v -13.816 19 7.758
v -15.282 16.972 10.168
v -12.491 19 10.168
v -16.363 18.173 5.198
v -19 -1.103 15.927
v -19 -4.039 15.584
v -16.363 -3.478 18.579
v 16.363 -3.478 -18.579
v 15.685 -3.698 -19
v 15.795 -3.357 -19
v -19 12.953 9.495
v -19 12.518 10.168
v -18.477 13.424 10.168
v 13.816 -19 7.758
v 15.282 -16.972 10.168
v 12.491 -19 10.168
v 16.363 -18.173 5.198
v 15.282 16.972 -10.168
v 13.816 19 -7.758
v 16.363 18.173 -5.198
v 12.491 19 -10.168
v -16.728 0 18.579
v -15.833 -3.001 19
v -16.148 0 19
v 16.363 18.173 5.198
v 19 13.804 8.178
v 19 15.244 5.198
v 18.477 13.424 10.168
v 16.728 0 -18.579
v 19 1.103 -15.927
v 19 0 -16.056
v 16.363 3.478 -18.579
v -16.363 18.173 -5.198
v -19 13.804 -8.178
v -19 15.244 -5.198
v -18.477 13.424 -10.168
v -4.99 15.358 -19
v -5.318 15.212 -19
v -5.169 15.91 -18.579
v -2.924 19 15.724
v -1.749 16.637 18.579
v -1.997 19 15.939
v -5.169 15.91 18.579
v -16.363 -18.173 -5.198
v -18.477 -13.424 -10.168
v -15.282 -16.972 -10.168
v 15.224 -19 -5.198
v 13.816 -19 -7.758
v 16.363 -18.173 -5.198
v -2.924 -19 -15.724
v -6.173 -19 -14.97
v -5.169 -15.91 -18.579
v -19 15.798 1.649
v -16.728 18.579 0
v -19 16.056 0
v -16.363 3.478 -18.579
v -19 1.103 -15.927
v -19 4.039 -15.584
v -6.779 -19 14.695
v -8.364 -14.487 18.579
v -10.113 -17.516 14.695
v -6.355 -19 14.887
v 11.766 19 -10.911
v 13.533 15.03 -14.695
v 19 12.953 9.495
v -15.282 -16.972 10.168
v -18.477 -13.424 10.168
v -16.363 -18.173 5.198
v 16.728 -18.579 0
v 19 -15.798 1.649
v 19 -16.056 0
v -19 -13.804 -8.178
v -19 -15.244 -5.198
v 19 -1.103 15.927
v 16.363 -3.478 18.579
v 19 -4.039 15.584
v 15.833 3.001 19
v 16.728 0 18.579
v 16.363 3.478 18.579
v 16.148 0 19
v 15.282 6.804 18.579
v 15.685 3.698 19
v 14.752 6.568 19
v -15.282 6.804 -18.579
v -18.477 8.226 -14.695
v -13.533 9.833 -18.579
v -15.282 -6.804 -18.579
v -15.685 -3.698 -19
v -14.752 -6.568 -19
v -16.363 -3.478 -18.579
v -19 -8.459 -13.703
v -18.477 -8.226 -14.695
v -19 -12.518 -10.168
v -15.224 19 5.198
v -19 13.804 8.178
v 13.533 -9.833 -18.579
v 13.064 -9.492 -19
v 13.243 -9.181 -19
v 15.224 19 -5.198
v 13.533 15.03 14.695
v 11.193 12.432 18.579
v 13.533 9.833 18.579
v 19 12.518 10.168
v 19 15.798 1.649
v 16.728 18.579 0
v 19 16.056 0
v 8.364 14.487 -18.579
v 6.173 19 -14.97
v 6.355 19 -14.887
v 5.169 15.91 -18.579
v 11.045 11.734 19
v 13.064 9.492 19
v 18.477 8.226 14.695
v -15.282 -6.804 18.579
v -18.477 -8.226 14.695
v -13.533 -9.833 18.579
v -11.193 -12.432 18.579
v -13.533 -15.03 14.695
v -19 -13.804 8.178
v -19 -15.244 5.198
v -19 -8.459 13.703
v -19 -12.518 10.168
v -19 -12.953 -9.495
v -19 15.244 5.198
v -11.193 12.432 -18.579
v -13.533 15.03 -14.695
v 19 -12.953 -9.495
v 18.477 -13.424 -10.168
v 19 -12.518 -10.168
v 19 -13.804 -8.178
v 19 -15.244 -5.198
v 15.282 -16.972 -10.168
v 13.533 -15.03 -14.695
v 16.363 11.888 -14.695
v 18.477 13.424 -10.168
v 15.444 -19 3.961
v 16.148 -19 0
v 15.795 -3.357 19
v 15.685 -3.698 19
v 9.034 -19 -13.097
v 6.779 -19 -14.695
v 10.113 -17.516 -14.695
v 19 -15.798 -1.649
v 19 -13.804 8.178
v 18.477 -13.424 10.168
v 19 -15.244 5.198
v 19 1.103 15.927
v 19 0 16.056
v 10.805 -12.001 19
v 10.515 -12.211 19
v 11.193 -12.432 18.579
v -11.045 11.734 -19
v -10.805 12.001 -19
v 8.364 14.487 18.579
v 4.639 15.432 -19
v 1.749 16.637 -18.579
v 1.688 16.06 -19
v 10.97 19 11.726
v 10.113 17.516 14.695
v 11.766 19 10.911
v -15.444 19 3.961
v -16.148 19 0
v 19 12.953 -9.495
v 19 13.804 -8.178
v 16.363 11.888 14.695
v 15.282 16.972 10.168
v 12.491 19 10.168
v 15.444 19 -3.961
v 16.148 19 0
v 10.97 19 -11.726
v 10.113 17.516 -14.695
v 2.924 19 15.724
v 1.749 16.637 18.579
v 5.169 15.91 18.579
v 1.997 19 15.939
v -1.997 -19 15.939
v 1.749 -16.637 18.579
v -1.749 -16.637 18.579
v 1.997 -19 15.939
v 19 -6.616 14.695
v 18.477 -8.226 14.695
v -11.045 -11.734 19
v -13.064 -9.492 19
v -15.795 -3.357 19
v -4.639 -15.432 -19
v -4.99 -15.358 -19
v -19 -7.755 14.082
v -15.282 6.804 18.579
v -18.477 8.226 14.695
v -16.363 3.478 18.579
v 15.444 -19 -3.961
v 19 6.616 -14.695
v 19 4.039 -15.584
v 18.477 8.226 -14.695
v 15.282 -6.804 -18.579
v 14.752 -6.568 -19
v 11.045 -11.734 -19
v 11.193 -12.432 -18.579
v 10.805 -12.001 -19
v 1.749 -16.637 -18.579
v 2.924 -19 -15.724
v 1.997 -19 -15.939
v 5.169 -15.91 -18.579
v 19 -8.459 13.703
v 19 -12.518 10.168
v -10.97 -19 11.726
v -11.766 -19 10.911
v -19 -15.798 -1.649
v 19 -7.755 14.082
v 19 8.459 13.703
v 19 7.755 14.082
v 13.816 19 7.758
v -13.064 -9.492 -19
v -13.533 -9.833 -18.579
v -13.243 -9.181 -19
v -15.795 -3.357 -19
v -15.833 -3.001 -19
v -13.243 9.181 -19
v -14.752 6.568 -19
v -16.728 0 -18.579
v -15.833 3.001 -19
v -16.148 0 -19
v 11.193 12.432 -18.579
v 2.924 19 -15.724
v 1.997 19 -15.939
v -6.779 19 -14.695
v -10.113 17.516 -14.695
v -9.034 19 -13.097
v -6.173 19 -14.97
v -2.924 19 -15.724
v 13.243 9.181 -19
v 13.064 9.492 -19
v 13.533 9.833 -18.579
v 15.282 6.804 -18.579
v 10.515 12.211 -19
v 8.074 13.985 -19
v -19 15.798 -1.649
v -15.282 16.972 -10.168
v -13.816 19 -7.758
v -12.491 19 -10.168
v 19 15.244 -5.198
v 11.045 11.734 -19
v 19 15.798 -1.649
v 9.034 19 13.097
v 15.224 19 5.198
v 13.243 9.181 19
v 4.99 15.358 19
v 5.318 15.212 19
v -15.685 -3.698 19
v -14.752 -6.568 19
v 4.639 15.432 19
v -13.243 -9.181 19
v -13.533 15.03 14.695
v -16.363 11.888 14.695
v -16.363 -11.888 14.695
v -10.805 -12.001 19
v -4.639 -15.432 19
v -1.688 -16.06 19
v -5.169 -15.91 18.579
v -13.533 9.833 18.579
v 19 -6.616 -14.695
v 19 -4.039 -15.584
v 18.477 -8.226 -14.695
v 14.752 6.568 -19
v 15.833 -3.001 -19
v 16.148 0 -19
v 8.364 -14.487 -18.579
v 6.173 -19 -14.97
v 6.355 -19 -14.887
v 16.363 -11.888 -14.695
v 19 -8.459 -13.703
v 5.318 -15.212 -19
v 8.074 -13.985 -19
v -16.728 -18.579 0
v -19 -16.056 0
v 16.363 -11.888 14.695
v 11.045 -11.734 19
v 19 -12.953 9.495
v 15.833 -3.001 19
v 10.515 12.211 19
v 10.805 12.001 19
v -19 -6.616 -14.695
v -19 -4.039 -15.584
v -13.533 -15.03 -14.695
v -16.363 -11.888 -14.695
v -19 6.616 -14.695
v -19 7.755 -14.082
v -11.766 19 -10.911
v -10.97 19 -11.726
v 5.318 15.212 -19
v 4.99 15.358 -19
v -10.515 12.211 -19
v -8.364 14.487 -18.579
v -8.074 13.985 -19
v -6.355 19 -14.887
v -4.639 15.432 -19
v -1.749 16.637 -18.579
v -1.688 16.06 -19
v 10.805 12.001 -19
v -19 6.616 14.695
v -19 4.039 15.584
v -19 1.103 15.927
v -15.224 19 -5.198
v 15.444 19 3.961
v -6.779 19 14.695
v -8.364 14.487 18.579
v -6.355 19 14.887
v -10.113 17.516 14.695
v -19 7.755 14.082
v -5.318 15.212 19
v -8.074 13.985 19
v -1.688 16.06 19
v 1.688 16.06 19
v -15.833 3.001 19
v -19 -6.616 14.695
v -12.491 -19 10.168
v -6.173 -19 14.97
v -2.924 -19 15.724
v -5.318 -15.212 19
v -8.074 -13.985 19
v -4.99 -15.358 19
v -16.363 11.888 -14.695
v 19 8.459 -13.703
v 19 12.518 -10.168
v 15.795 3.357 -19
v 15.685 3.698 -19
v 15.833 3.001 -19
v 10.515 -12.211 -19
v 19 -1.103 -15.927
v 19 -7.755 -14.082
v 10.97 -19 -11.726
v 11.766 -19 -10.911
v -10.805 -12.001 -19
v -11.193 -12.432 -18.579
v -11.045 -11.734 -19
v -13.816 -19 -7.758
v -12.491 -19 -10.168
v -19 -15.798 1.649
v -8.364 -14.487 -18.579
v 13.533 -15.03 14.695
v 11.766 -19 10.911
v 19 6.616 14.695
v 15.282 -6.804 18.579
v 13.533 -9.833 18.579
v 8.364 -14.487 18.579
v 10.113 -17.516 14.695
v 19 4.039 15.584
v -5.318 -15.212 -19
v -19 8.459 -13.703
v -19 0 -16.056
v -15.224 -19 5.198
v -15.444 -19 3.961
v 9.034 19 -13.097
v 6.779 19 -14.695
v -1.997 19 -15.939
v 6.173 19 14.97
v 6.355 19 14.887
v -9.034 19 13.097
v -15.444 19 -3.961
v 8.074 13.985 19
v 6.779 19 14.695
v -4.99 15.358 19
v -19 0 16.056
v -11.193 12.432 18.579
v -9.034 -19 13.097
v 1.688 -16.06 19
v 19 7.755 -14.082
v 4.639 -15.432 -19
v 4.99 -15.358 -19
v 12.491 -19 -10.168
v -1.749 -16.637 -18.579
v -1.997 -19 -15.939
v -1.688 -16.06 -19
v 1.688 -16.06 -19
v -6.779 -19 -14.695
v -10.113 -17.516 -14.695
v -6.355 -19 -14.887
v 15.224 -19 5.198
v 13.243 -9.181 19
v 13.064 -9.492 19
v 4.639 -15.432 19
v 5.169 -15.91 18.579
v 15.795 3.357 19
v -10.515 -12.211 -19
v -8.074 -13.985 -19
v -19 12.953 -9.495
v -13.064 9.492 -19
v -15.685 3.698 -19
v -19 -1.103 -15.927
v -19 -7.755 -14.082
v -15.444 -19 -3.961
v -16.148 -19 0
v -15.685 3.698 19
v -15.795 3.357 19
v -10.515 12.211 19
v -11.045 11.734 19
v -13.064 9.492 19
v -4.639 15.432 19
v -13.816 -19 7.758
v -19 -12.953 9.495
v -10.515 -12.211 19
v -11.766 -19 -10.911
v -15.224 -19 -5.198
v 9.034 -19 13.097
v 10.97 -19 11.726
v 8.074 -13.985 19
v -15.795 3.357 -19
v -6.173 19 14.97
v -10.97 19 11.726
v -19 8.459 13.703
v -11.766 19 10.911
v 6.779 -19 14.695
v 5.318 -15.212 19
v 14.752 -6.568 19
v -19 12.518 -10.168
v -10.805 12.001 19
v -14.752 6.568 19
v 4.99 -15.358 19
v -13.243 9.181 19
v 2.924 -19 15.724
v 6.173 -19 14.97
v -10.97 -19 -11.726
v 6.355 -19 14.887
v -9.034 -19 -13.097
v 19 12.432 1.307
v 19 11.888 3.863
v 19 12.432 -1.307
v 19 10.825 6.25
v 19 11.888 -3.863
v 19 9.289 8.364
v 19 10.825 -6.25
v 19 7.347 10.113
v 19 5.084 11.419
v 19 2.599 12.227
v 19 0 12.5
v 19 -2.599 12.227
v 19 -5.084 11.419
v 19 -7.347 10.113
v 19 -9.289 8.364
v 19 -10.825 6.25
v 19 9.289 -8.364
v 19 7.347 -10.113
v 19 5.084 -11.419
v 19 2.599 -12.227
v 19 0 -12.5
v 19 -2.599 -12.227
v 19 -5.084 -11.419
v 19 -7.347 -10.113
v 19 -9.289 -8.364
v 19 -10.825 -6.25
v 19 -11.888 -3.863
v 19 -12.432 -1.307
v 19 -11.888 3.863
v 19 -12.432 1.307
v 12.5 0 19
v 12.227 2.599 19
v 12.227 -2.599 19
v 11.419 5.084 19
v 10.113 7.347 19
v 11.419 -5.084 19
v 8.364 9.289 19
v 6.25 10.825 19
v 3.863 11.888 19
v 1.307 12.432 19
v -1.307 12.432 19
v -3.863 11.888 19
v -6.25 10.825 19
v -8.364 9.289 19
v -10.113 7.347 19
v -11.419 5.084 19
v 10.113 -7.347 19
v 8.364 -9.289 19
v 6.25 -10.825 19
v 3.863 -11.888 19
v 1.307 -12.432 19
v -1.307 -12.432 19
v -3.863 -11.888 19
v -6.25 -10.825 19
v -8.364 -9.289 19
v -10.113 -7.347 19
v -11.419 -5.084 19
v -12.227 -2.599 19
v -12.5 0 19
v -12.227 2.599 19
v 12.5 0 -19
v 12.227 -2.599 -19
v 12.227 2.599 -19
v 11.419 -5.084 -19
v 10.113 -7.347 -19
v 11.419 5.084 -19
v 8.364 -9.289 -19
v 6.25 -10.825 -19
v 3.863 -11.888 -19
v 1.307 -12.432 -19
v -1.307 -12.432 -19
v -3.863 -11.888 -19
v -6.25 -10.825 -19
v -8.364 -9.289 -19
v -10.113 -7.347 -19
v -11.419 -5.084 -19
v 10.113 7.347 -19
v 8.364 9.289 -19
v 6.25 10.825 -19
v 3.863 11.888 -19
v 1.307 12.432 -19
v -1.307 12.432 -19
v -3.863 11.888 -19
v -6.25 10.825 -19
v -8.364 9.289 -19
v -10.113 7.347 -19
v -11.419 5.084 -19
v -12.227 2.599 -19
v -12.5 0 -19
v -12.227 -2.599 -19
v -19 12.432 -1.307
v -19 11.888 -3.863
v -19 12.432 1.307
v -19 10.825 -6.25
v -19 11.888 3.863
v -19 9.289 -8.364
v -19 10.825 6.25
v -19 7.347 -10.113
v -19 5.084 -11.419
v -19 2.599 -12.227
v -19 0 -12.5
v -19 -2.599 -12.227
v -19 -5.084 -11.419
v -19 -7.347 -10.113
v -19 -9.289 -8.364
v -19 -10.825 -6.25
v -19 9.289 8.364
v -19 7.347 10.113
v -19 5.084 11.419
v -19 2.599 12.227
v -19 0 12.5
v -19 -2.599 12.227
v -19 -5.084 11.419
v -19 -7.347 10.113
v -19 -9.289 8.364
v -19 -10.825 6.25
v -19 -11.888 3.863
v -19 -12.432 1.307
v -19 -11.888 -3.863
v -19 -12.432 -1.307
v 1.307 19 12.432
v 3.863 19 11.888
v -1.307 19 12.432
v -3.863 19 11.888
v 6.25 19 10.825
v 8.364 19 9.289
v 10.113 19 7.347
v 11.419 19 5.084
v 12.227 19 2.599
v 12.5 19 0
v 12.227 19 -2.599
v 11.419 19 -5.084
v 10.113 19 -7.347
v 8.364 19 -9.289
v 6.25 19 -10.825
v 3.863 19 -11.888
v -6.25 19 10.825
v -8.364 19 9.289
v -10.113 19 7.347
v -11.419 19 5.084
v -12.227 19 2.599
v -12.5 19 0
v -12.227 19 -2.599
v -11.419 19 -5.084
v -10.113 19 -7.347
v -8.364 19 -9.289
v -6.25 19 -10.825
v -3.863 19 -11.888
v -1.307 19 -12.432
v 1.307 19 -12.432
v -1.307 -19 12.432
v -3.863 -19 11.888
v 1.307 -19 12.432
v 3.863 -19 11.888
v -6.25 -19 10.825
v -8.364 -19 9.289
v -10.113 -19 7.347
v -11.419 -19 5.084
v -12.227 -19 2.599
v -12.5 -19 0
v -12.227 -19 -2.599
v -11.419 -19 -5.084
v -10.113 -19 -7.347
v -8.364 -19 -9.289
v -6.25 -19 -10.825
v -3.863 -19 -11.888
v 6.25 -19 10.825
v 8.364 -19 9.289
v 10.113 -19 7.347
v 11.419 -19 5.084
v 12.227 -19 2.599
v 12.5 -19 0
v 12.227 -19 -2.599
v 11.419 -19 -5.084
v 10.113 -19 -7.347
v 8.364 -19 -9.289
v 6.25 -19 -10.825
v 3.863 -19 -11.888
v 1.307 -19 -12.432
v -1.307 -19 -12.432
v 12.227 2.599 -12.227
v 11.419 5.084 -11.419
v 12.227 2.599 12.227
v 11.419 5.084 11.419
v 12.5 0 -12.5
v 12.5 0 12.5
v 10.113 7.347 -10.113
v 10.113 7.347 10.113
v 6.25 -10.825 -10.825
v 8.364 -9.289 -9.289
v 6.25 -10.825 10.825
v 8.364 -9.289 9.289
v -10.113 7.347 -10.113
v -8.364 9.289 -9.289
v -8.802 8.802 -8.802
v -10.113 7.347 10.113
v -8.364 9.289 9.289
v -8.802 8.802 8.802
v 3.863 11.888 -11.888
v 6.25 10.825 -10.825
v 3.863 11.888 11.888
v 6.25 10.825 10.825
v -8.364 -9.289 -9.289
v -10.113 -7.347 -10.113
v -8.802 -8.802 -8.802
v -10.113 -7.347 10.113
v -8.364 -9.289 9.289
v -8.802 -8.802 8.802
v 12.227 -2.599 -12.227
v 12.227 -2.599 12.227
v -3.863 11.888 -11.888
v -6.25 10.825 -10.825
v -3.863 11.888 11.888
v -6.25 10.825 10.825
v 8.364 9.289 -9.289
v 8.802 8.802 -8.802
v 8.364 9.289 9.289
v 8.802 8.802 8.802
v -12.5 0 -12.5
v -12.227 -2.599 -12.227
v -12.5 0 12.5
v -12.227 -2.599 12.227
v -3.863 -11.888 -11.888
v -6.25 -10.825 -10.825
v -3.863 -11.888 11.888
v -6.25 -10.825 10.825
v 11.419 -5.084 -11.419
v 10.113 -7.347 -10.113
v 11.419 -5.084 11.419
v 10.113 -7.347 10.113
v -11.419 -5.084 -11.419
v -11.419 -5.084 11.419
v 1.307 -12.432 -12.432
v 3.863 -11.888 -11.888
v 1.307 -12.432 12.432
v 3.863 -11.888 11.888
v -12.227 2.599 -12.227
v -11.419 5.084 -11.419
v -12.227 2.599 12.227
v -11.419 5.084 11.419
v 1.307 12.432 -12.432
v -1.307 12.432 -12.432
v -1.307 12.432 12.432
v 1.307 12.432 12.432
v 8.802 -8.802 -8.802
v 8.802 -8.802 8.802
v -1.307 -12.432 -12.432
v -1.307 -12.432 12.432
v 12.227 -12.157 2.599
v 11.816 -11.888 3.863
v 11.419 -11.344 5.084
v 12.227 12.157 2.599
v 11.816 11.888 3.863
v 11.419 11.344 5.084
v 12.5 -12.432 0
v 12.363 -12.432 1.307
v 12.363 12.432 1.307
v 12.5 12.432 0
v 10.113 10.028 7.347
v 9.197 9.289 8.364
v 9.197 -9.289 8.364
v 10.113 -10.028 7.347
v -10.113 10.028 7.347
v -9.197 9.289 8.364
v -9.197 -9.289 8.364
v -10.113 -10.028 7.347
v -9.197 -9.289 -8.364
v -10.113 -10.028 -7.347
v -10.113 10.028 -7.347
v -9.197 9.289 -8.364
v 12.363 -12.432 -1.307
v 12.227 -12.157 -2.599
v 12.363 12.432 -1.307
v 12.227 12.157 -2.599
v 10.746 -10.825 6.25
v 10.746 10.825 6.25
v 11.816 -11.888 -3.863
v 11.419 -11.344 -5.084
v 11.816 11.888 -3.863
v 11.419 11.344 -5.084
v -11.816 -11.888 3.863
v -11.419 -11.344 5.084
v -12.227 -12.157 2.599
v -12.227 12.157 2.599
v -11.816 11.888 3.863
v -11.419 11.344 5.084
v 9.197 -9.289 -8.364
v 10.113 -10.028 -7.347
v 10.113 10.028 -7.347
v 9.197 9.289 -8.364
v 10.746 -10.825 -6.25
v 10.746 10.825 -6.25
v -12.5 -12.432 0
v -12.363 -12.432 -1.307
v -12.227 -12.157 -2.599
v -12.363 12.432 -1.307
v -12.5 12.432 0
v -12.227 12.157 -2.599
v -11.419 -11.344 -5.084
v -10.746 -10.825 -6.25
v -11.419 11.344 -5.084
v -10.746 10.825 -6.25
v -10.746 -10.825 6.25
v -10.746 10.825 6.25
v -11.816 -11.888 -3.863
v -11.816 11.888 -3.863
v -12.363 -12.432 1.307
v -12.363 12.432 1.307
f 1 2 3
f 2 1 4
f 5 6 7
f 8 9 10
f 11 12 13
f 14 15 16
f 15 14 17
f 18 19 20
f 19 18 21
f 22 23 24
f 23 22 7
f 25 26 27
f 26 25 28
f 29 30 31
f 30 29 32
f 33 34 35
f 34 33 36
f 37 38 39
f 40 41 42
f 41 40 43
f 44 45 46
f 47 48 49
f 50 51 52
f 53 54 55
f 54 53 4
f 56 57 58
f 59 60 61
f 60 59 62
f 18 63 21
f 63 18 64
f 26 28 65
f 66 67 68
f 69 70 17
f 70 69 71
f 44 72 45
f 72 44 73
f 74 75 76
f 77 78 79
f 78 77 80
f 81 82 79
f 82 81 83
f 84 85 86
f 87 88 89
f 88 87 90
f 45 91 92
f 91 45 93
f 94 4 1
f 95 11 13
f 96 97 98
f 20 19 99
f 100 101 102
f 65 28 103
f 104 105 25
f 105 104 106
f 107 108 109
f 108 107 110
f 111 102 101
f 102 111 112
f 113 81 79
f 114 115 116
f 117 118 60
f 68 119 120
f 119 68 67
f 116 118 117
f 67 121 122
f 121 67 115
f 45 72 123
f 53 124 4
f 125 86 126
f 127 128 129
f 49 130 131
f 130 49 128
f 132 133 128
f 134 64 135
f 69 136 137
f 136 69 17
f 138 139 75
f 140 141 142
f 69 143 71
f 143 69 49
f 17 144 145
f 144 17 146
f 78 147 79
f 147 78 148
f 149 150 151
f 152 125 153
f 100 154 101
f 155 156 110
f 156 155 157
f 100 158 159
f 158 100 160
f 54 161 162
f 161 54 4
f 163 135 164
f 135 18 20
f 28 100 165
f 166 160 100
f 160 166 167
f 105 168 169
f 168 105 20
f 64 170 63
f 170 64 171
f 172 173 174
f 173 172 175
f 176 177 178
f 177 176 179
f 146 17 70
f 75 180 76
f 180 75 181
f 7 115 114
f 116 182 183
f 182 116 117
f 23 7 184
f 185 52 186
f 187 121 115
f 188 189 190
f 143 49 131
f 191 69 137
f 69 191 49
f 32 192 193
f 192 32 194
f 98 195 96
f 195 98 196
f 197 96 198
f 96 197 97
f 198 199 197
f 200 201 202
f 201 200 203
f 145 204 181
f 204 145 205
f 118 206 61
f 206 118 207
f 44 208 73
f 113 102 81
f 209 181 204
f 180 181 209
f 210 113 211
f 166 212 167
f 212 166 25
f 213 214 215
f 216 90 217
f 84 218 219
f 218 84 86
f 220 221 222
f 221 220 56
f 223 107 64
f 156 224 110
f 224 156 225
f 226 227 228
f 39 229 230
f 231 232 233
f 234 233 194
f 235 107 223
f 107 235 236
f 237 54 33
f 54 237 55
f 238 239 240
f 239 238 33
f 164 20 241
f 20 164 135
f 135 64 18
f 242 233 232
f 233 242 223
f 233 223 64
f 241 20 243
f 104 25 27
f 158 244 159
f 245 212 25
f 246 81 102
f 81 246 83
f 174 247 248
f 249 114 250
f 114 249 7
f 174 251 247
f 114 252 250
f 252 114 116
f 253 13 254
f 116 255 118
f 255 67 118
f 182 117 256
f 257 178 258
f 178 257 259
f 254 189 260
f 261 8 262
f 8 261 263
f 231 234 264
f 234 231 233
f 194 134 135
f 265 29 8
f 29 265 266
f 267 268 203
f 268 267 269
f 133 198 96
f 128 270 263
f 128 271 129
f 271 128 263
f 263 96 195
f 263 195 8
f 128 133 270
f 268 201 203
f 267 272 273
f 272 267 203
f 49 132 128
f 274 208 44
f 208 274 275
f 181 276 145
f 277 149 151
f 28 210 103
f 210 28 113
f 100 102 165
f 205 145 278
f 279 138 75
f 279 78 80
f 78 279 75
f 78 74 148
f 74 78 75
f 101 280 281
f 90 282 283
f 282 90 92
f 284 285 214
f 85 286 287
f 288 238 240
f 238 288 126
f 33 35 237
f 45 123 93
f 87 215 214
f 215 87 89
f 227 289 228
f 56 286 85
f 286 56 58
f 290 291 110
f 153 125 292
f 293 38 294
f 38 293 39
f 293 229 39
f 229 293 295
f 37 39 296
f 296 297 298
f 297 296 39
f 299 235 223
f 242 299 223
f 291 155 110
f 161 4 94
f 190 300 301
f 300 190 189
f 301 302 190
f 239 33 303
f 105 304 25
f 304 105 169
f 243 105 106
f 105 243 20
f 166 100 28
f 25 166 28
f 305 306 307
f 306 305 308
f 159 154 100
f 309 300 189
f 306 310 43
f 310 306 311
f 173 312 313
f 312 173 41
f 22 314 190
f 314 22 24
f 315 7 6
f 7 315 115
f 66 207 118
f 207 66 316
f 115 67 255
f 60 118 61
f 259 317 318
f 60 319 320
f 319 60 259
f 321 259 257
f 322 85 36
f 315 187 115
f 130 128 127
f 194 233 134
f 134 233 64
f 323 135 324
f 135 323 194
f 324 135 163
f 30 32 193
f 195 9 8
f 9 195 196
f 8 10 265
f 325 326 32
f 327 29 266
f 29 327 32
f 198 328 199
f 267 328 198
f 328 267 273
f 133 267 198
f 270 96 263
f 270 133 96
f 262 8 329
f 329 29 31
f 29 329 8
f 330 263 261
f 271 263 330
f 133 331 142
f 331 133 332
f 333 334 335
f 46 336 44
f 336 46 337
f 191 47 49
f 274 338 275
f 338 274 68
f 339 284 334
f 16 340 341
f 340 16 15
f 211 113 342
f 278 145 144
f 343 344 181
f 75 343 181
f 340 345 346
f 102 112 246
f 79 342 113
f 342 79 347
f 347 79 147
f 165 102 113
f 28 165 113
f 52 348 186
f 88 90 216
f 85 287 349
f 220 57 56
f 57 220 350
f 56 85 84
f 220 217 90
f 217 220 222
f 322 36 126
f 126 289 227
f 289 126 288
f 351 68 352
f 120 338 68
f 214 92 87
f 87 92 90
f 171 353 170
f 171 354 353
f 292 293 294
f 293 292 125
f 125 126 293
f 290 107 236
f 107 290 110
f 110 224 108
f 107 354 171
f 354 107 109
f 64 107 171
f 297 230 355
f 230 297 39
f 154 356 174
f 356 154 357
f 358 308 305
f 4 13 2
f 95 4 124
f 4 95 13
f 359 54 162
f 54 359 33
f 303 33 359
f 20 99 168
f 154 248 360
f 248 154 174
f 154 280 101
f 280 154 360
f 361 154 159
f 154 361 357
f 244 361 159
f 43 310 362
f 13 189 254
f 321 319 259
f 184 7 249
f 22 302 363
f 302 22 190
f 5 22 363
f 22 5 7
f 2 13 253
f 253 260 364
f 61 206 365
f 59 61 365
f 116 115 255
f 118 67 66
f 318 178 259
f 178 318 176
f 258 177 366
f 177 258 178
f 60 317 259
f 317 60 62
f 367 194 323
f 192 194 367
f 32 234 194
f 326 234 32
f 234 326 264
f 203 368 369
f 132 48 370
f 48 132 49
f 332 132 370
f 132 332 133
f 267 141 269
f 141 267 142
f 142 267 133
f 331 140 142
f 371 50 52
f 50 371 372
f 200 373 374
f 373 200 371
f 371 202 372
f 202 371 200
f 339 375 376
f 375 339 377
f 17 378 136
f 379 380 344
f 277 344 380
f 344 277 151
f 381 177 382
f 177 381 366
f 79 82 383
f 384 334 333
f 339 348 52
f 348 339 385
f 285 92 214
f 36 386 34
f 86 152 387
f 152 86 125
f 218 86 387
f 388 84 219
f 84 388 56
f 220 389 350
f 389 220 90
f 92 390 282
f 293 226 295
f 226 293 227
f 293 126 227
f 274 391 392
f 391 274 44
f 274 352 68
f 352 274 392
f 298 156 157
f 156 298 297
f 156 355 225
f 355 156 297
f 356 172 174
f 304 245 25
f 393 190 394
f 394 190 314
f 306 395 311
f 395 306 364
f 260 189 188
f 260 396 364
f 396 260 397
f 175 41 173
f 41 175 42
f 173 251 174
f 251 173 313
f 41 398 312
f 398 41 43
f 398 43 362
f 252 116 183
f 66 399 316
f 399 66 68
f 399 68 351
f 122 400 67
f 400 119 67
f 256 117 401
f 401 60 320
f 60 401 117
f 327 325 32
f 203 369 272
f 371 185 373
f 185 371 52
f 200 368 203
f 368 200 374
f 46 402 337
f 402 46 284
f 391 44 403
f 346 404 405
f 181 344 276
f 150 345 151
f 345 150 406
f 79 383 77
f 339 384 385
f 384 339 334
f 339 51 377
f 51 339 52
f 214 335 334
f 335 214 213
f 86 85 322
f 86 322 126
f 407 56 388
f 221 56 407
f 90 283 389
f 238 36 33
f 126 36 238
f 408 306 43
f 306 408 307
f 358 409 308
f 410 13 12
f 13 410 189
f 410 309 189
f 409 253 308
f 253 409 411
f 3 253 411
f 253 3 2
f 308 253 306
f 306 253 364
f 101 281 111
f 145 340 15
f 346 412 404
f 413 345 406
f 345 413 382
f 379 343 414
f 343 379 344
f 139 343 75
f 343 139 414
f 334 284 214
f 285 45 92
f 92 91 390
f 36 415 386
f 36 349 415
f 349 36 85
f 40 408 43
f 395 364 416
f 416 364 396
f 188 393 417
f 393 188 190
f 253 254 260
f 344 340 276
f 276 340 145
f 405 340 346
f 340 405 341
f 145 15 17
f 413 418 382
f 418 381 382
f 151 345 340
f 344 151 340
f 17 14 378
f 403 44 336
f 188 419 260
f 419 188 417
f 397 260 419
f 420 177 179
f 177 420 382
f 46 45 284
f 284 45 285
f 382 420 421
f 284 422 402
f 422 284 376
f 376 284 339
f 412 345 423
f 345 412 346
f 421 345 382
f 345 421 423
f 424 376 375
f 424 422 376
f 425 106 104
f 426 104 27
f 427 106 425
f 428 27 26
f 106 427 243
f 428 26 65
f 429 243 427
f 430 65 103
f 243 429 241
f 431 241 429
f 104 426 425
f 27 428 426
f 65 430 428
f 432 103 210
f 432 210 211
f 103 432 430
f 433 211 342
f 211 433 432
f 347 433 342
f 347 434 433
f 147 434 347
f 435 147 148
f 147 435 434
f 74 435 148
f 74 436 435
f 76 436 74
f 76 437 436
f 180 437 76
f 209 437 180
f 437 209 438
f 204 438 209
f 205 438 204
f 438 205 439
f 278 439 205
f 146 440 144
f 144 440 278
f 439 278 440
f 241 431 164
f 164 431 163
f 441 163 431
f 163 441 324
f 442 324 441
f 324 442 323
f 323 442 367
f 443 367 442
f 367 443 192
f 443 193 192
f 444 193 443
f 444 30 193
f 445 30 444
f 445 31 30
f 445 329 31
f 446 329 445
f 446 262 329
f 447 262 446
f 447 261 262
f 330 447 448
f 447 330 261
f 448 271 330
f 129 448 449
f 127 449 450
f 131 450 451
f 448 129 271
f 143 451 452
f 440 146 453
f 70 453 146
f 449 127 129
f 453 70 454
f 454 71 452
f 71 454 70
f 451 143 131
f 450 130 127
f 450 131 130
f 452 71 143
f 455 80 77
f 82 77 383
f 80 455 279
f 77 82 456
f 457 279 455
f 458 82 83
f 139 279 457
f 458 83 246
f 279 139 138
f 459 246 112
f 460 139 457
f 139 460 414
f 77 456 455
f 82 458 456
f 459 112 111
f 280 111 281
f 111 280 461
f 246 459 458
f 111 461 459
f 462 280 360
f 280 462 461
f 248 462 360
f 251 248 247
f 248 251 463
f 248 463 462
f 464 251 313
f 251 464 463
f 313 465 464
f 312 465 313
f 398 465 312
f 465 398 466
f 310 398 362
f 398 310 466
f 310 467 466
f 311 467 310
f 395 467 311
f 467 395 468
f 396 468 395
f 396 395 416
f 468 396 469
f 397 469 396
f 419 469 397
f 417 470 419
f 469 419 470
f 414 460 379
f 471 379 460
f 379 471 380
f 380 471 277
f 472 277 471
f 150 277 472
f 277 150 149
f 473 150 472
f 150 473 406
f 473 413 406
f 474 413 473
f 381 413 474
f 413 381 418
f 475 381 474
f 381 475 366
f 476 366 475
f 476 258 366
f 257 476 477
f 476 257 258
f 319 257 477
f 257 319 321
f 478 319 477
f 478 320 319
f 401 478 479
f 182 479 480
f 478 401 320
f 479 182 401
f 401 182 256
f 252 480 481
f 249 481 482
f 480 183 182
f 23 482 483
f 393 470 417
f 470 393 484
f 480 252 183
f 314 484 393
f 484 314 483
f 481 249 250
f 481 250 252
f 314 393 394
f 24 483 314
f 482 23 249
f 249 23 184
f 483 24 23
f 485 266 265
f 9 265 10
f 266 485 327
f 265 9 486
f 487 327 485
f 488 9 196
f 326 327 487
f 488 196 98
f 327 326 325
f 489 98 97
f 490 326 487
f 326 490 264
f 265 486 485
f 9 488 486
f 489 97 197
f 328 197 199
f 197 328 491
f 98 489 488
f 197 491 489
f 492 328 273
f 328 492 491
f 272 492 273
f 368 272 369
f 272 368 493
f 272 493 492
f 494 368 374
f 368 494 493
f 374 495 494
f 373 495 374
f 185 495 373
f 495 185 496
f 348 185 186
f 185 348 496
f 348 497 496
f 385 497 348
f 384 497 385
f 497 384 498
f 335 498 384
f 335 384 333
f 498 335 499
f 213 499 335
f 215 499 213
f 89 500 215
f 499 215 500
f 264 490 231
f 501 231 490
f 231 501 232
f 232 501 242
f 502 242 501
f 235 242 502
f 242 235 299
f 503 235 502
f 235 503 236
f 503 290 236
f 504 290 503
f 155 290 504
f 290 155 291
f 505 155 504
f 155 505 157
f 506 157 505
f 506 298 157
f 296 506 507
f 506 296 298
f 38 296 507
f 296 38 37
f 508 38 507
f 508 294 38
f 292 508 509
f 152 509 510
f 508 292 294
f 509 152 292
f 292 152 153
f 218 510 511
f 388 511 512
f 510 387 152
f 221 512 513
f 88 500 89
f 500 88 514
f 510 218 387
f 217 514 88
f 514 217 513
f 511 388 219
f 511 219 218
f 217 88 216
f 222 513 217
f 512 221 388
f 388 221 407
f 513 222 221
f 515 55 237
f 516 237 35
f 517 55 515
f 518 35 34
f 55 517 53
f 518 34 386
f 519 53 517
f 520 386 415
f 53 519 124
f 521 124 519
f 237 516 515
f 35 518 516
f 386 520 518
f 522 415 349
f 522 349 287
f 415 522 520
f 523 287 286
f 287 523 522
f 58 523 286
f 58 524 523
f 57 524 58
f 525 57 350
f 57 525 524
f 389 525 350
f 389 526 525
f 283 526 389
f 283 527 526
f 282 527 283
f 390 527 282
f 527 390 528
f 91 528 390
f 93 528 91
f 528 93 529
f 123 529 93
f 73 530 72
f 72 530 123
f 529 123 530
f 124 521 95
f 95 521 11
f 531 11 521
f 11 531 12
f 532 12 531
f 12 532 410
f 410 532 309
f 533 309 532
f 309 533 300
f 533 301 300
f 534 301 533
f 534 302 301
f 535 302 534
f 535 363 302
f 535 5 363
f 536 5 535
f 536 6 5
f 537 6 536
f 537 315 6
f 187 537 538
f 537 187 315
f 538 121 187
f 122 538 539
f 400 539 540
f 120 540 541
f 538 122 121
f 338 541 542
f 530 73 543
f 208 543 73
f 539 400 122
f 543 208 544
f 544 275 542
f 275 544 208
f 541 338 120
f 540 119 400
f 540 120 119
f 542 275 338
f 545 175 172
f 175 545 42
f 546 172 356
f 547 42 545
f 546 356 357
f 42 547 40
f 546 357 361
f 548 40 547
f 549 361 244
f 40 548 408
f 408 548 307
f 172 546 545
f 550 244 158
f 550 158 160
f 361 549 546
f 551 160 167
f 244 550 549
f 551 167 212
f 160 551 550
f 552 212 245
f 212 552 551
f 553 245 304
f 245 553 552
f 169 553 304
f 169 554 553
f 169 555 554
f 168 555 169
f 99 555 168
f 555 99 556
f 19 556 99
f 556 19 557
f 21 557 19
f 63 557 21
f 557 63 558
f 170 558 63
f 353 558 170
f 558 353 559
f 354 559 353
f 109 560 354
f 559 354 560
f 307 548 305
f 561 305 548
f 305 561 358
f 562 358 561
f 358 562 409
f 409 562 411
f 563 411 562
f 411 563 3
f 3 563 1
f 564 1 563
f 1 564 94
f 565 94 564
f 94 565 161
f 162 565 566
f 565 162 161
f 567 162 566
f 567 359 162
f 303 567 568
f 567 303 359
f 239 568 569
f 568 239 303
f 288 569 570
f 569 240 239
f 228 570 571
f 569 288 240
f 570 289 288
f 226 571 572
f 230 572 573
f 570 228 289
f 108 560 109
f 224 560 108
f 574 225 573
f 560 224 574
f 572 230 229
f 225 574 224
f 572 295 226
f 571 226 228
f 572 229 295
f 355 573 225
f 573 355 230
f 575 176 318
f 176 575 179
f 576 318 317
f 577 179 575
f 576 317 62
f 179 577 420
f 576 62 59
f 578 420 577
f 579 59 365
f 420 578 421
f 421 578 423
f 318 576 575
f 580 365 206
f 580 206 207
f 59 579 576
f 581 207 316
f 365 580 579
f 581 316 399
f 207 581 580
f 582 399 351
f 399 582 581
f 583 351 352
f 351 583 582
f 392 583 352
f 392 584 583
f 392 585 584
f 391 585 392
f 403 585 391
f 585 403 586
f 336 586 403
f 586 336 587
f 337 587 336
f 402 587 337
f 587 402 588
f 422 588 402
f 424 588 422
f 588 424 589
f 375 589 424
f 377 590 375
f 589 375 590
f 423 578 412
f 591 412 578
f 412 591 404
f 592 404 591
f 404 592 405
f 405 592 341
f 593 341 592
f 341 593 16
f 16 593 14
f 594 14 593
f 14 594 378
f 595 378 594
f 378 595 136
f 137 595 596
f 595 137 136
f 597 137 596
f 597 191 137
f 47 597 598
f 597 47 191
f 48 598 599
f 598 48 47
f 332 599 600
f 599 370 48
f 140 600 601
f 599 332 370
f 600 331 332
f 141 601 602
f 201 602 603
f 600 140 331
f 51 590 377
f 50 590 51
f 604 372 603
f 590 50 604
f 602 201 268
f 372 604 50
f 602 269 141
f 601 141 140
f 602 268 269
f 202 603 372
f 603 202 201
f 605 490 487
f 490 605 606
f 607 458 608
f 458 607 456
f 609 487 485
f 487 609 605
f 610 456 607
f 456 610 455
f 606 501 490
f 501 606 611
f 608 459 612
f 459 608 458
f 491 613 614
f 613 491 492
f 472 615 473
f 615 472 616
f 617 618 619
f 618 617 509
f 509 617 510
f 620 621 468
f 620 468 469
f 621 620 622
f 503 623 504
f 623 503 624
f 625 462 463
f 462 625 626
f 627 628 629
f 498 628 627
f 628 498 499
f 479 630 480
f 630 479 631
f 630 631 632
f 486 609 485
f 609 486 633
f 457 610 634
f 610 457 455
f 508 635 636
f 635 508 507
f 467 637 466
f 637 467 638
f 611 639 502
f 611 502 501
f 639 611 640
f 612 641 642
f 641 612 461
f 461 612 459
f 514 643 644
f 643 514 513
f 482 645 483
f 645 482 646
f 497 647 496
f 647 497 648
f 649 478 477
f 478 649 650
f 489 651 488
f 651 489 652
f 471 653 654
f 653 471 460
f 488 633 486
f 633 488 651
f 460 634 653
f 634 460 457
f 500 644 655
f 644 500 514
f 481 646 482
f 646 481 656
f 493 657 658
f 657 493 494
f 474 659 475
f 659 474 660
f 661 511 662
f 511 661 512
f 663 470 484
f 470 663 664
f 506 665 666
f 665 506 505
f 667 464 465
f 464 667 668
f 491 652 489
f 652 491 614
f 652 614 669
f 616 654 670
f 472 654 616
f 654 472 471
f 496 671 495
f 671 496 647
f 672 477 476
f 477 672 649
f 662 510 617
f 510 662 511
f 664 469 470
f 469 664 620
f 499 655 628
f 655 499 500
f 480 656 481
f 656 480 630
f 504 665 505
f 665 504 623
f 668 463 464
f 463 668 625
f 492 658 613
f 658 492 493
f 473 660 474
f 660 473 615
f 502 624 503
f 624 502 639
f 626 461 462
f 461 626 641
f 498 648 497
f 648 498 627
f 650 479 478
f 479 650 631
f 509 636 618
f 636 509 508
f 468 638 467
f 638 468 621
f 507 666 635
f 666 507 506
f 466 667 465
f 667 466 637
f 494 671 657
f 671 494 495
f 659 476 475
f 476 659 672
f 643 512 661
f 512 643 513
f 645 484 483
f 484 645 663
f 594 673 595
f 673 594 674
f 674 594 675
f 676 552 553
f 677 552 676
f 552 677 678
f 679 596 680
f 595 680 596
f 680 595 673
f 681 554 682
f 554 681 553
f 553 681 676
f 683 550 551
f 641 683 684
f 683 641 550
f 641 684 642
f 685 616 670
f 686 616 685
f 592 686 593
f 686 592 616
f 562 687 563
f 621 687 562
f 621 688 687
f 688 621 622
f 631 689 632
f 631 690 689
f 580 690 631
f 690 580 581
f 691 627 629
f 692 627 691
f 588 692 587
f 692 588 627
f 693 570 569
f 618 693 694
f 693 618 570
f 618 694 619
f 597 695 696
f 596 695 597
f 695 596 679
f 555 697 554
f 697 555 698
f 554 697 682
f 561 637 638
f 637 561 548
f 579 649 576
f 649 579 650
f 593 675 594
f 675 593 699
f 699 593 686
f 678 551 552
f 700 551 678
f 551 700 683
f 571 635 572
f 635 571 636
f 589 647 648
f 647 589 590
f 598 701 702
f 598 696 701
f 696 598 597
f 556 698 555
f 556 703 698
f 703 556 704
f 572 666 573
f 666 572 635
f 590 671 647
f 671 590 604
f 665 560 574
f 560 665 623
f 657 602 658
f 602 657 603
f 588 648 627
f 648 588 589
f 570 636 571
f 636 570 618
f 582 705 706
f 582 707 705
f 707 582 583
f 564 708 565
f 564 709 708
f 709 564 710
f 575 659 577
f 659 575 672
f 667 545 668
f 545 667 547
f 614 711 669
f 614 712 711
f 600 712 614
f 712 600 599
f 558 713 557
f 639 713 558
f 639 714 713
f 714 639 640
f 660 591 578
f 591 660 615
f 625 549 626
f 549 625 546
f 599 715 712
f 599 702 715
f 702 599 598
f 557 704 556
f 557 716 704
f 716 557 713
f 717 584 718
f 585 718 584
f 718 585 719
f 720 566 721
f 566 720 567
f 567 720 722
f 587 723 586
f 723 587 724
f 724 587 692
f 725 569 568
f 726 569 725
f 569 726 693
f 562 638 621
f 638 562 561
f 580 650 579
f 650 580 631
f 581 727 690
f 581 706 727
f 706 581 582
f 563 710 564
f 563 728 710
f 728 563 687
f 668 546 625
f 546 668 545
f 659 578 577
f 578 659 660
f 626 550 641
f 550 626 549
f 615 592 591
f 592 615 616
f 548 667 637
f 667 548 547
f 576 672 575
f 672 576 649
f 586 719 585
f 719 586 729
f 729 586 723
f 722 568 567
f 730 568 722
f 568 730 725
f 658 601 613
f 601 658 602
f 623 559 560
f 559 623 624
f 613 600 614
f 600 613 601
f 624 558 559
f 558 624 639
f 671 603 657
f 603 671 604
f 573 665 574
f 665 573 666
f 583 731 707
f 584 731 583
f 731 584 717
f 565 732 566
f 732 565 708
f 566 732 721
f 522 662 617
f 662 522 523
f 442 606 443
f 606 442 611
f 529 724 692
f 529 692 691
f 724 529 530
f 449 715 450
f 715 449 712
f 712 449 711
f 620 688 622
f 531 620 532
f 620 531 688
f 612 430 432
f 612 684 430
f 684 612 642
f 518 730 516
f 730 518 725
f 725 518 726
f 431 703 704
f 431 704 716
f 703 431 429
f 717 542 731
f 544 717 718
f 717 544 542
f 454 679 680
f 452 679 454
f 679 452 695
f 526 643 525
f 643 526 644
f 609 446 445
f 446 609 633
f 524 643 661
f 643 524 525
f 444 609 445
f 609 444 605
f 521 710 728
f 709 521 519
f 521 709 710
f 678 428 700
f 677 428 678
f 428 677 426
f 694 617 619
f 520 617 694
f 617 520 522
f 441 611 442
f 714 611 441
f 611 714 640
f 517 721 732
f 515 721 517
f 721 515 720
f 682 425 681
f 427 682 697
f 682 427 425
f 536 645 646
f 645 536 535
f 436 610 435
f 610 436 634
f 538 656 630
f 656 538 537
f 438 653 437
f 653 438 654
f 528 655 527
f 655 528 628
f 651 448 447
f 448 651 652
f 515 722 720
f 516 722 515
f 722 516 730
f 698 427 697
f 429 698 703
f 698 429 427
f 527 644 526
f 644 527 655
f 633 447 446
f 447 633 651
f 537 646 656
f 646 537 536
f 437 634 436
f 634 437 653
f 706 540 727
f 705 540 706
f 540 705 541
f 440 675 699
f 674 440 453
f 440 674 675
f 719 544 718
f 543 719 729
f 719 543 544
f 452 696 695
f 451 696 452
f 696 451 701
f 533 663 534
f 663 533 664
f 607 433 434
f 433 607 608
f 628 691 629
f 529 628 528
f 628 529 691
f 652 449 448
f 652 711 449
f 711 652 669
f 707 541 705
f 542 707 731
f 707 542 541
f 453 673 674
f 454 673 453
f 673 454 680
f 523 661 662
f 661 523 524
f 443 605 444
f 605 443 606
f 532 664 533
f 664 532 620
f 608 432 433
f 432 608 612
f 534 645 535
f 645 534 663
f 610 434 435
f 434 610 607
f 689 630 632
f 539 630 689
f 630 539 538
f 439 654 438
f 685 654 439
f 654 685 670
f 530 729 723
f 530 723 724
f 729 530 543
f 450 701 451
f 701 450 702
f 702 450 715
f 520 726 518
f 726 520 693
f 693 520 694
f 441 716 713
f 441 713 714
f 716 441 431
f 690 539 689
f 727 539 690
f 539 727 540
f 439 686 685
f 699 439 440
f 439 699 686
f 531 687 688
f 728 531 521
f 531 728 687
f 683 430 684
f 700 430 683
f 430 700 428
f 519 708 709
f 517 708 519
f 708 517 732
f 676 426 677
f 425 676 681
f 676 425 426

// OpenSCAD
module ball()
{
	function r_from_dia(d) = d / 2;

	module rotcy(rot, r, h) {
		rotate(90, rot)
			cylinder(r = r, h = h, center = true);
	}

	difference() {
		intersection(){
			sphere(r = size/2);
			cube(38, center=true);
		}
		rotcy([0, 0, 0], cy_r, cy_h);
		rotcy([1, 0, 0], cy_r, cy_h);
		rotcy([0, 1, 0], cy_r, cy_h);
	}

	size = 50;
	hole = 25;

	cy_r = r_from_dia(hole);
	cy_h = r_from_dia(size * 2);
}

ball();
